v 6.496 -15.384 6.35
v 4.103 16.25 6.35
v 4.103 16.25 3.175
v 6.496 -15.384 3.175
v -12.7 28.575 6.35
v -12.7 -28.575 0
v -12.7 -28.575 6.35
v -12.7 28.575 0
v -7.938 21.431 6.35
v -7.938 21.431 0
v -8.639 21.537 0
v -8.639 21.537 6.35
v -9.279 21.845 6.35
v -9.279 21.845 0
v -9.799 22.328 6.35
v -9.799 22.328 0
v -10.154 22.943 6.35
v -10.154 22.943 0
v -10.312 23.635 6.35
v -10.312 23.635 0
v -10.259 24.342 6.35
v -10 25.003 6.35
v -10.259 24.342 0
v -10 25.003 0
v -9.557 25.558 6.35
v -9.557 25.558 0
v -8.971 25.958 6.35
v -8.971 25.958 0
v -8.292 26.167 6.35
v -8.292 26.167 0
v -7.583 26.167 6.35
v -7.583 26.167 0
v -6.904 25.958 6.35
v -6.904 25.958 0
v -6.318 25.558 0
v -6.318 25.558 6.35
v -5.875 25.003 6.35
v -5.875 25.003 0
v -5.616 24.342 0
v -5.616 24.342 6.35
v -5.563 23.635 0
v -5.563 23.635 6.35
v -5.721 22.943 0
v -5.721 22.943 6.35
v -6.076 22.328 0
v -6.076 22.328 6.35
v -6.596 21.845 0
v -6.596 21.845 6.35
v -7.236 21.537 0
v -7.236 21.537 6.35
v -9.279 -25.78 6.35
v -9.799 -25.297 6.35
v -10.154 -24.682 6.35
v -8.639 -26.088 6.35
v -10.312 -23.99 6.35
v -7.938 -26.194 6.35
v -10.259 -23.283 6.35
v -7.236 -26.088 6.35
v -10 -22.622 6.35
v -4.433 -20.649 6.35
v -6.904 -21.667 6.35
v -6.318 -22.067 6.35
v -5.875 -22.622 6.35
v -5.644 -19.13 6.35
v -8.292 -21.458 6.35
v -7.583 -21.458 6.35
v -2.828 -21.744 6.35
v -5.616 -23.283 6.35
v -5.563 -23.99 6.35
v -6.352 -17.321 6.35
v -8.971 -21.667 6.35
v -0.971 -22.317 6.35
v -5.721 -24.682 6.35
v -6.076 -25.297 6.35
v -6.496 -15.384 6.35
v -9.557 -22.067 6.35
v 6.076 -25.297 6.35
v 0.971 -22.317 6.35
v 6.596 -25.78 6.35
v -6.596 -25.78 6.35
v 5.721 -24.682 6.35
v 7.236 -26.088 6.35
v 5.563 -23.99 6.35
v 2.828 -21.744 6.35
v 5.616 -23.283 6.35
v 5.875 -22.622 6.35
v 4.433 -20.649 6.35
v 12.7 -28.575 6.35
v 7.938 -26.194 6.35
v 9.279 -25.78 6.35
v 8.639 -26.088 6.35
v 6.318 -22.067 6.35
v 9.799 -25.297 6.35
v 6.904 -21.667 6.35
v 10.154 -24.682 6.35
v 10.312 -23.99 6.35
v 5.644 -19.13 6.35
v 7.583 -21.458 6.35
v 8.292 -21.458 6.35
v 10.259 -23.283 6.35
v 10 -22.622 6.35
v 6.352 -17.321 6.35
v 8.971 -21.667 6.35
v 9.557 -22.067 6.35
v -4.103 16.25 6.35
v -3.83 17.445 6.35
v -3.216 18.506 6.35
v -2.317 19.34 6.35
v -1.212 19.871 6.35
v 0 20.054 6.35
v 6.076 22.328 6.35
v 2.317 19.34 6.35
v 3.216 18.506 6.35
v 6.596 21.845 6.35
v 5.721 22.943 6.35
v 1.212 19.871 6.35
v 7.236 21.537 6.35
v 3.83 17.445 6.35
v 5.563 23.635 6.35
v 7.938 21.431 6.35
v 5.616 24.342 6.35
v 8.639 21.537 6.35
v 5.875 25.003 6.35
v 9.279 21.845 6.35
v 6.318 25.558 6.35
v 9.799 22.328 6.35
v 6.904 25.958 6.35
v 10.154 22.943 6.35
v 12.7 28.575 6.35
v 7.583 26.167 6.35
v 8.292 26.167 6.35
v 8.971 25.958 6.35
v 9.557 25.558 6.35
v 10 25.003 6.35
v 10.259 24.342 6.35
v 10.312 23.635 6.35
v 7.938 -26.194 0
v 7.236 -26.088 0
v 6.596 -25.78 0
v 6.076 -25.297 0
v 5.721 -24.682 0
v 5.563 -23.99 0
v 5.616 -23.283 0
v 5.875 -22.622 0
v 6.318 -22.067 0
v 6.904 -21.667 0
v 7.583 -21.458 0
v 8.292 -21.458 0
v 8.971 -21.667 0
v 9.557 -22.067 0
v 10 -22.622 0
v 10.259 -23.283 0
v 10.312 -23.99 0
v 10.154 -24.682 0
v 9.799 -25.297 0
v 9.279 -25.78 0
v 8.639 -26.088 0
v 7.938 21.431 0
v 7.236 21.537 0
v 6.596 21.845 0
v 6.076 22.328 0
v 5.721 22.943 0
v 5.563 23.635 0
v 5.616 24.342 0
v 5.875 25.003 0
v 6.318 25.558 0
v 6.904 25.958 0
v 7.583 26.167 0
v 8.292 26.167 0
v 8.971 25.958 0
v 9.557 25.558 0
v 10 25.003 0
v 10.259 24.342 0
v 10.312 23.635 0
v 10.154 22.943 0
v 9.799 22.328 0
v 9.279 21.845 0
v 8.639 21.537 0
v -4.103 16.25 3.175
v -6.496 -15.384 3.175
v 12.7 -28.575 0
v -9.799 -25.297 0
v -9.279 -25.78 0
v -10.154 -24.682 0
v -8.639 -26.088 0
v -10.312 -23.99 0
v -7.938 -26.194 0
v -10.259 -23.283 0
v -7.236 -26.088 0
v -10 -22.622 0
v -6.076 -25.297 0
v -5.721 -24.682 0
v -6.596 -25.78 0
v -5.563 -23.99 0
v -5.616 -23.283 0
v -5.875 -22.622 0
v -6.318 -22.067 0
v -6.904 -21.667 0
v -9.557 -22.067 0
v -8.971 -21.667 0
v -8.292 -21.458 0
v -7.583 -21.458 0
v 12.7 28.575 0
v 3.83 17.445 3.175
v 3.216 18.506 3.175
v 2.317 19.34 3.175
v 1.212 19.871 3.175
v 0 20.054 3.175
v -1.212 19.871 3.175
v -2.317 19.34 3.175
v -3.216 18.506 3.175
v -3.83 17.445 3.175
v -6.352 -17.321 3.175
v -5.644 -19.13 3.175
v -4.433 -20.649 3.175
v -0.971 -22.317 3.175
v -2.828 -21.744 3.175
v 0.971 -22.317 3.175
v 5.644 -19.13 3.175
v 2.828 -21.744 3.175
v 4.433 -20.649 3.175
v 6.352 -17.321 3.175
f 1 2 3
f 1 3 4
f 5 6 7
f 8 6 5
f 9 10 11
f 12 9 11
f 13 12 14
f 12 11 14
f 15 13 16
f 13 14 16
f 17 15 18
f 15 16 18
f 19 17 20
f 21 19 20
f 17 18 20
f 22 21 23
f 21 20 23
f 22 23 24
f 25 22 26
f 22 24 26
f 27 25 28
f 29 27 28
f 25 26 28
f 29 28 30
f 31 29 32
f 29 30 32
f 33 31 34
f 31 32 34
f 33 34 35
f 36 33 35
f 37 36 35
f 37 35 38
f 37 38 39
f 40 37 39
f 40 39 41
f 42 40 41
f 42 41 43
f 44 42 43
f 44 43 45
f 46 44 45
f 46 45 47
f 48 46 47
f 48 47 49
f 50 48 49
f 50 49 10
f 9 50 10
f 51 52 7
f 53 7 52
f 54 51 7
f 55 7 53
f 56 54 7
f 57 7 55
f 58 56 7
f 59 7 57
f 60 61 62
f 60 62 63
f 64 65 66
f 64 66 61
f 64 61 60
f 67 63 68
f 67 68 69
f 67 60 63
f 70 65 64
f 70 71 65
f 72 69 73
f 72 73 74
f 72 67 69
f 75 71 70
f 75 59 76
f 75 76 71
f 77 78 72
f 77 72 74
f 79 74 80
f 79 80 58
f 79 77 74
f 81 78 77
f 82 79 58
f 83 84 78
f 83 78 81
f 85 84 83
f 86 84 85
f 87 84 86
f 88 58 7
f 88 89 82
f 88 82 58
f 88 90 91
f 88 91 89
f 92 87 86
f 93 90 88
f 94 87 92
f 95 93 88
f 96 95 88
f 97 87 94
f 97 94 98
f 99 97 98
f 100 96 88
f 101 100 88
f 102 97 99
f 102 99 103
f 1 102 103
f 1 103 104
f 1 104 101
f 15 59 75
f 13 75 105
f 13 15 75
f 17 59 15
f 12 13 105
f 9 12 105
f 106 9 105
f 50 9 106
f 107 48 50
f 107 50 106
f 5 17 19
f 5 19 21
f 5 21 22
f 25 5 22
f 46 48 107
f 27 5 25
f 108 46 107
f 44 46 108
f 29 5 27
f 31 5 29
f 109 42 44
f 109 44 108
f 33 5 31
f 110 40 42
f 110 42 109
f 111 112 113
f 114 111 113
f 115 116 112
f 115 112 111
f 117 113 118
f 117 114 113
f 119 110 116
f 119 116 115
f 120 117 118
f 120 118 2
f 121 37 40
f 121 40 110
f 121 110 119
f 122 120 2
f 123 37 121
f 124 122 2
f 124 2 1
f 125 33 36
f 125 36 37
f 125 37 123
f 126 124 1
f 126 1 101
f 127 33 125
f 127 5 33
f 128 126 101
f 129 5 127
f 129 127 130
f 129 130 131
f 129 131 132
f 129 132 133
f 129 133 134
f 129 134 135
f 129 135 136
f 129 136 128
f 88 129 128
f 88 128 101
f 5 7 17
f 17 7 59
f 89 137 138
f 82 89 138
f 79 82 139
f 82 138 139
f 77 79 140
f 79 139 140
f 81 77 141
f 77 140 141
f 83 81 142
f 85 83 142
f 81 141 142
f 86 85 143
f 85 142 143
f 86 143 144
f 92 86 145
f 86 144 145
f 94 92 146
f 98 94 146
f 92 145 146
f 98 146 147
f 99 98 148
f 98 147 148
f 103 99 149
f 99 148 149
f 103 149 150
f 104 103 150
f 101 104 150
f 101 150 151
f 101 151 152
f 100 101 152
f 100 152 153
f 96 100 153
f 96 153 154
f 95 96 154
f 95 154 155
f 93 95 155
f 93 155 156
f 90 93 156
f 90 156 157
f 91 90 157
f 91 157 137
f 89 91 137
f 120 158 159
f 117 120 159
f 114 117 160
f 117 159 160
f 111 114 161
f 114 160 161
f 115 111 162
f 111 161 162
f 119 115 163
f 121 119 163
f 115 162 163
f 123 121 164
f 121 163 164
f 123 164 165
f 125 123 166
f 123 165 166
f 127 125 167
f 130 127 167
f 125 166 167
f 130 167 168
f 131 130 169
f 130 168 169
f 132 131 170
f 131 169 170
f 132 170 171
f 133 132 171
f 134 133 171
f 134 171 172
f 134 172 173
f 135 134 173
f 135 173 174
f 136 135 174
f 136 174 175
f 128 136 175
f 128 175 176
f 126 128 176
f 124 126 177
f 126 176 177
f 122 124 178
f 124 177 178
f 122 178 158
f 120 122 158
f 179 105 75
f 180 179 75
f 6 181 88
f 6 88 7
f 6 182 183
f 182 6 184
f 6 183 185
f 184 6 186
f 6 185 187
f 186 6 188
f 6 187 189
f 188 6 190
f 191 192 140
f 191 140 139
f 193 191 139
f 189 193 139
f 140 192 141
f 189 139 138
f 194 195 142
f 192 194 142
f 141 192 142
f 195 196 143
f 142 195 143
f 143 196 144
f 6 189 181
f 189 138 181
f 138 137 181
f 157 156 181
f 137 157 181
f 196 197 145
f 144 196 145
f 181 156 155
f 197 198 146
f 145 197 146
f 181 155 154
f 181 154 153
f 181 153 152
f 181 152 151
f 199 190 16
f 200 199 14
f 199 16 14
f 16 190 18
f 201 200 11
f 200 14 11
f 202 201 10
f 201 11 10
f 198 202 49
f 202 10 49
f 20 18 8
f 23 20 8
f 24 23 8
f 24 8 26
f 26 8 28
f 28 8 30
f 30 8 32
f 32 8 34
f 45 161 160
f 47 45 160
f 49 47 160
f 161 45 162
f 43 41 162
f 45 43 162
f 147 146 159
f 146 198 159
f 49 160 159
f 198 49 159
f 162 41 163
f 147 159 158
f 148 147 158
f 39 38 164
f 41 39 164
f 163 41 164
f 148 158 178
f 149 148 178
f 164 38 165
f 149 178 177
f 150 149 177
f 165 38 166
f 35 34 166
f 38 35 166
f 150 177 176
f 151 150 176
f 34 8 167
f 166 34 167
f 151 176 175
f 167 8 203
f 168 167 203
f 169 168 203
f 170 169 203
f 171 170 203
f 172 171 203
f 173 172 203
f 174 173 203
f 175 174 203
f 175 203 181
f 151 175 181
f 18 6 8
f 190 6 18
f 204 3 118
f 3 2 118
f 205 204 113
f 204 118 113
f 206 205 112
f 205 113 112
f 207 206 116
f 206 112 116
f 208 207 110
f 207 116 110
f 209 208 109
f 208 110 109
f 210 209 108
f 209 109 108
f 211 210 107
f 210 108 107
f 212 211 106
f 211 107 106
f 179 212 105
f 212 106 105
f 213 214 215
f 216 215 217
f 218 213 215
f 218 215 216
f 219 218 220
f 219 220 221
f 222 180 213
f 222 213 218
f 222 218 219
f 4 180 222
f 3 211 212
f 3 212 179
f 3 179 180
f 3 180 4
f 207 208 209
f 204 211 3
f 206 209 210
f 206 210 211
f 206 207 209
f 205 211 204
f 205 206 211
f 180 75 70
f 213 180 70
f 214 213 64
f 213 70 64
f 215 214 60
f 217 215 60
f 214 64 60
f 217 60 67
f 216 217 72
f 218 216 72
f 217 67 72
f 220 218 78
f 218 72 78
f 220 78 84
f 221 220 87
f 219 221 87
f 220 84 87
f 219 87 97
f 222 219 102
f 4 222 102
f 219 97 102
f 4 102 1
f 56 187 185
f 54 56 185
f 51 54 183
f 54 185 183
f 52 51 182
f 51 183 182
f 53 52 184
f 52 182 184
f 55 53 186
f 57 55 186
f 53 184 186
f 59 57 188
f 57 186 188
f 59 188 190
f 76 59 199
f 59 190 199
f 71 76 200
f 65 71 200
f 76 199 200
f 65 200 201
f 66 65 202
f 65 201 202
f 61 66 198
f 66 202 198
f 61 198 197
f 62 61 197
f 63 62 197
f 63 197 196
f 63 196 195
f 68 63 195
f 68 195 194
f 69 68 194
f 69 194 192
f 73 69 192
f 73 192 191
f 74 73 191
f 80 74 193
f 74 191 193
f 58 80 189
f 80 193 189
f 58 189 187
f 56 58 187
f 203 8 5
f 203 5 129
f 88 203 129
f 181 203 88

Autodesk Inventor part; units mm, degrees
ref_plane "YZ Plane" through (0, 0, 0) normal (1, 0, 0) x (0, 1, 0)
ref_plane "XZ Plane" through (0, 0, 0) normal (0, 1, 0) x (-1, 0, 0)
ref_plane "XY Plane" through (0, 0, 0) normal (0, 0, 1) x (1, 0, 0)
sketch "Sketch1" plane through (0, 0, 0) normal (0, 0, 1) x (1, 0, 0)
  line L0 (-12.7, 28.575) -> (12.7, 28.575)
  line L1 (12.7, 28.575) -> (12.7, -28.575)
  line L2 (12.7, -28.575) -> (-12.7, -28.575)
  line L3 (-12.7, -28.575) -> (-12.7, 28.575)
  point P0 (0, 0)
  point P1 (12.7, 0)
  point P2 (0, 28.575)
  dimension "d0" = 25.4
  dimension "d1" = 57.15
extrude "Extrusion1" add sketch "Sketch1" along normal blind 6.35
sketch "Sketch2" plane through (0, 0, 6.35) normal (0, 0, 1) x (1, 0, 0)
  arc A0 (-6.4964, -15.3835) -> (6.4964, -15.3835) centre (0, -15.875) ccw
  arc A1 (4.1031, 16.2496) -> (-4.1031, 16.2496) centre (0, 15.9392) ccw
  line L0 (4.1031, 16.2496) -> (6.4964, -15.3835)
  line L1 (-4.1031, 16.2496) -> (-6.4964, -15.3835)
  line L2 (-12.7, -28.575) -> (12.7, -28.575) projected
  line L3 (12.7, -28.575) -> (12.7, 28.575) projected
  dimension "d12" = 4.1148
  dimension "d13" = 6.515
  dimension "d18" = 4.327
  dimension "d23" = 12.7
  dimension "d54" = 31.8142
  dimension "d55" = 6.185
extrude "Extrusion2" cut sketch "Sketch2" against normal blind 3.175
sketch "Sketch4" plane through (0, 0, 6.35) normal (0, 0, 1) x (1, 0, 0)
  line L0 (7.9375, 23.8125) -> (-7.9375, 23.8125)
  line L1 (-7.9375, 23.8125) -> (-7.9375, -23.8125)
  line L2 (-7.9375, -23.8125) -> (7.9375, -23.8125)
  line L3 (7.9375, -23.8125) -> (7.9375, 23.8125)
  line L4 (12.7, 28.575) -> (12.7, -28.575) projected
  line L5 (-12.7, -28.575) -> (12.7, -28.575) projected
  point P0 (0, 0)
  dimension "d42" = 4.7625
  dimension "d43" = 4.7625
  dimension "d44" = 47.625
  dimension "d45" = 15.875
hole "Hole1" at (7.9375, 23.8125, 6.35) at (-7.9375, 23.8125, 6.35) at (-7.9375, -23.8125, 6.35) at (7.9375, -23.8125, 6.35) direction (0, 0, -1) diameter 4.7625 end through all
equation "\"d0\" = plate_width"
equation "\"d1\" = plate_height"
equation "\"d23\" = 0.5 * plate_width"
equation "\"d54\" = slot_centers"
equation "\"d42\" = hole_dist"
equation "\"d43\" = hole_dist"
equation "\"d44\" = plate_height - 2 * hole_dist"
equation "\"d45\" = plate_width - 2 * hole_dist"
equation "\"d46\" = hole_dia"
equation "\"plate_width\" = 25.4"
equation "\"plate_height\" = 57.15"
equation "\"slot_centers\" = 31.81417"
equation "\"hole_dia\" = 4.7625"
equation "\"hole_dist\" = 4.7625"
properties part number "ServoHornHolder"
